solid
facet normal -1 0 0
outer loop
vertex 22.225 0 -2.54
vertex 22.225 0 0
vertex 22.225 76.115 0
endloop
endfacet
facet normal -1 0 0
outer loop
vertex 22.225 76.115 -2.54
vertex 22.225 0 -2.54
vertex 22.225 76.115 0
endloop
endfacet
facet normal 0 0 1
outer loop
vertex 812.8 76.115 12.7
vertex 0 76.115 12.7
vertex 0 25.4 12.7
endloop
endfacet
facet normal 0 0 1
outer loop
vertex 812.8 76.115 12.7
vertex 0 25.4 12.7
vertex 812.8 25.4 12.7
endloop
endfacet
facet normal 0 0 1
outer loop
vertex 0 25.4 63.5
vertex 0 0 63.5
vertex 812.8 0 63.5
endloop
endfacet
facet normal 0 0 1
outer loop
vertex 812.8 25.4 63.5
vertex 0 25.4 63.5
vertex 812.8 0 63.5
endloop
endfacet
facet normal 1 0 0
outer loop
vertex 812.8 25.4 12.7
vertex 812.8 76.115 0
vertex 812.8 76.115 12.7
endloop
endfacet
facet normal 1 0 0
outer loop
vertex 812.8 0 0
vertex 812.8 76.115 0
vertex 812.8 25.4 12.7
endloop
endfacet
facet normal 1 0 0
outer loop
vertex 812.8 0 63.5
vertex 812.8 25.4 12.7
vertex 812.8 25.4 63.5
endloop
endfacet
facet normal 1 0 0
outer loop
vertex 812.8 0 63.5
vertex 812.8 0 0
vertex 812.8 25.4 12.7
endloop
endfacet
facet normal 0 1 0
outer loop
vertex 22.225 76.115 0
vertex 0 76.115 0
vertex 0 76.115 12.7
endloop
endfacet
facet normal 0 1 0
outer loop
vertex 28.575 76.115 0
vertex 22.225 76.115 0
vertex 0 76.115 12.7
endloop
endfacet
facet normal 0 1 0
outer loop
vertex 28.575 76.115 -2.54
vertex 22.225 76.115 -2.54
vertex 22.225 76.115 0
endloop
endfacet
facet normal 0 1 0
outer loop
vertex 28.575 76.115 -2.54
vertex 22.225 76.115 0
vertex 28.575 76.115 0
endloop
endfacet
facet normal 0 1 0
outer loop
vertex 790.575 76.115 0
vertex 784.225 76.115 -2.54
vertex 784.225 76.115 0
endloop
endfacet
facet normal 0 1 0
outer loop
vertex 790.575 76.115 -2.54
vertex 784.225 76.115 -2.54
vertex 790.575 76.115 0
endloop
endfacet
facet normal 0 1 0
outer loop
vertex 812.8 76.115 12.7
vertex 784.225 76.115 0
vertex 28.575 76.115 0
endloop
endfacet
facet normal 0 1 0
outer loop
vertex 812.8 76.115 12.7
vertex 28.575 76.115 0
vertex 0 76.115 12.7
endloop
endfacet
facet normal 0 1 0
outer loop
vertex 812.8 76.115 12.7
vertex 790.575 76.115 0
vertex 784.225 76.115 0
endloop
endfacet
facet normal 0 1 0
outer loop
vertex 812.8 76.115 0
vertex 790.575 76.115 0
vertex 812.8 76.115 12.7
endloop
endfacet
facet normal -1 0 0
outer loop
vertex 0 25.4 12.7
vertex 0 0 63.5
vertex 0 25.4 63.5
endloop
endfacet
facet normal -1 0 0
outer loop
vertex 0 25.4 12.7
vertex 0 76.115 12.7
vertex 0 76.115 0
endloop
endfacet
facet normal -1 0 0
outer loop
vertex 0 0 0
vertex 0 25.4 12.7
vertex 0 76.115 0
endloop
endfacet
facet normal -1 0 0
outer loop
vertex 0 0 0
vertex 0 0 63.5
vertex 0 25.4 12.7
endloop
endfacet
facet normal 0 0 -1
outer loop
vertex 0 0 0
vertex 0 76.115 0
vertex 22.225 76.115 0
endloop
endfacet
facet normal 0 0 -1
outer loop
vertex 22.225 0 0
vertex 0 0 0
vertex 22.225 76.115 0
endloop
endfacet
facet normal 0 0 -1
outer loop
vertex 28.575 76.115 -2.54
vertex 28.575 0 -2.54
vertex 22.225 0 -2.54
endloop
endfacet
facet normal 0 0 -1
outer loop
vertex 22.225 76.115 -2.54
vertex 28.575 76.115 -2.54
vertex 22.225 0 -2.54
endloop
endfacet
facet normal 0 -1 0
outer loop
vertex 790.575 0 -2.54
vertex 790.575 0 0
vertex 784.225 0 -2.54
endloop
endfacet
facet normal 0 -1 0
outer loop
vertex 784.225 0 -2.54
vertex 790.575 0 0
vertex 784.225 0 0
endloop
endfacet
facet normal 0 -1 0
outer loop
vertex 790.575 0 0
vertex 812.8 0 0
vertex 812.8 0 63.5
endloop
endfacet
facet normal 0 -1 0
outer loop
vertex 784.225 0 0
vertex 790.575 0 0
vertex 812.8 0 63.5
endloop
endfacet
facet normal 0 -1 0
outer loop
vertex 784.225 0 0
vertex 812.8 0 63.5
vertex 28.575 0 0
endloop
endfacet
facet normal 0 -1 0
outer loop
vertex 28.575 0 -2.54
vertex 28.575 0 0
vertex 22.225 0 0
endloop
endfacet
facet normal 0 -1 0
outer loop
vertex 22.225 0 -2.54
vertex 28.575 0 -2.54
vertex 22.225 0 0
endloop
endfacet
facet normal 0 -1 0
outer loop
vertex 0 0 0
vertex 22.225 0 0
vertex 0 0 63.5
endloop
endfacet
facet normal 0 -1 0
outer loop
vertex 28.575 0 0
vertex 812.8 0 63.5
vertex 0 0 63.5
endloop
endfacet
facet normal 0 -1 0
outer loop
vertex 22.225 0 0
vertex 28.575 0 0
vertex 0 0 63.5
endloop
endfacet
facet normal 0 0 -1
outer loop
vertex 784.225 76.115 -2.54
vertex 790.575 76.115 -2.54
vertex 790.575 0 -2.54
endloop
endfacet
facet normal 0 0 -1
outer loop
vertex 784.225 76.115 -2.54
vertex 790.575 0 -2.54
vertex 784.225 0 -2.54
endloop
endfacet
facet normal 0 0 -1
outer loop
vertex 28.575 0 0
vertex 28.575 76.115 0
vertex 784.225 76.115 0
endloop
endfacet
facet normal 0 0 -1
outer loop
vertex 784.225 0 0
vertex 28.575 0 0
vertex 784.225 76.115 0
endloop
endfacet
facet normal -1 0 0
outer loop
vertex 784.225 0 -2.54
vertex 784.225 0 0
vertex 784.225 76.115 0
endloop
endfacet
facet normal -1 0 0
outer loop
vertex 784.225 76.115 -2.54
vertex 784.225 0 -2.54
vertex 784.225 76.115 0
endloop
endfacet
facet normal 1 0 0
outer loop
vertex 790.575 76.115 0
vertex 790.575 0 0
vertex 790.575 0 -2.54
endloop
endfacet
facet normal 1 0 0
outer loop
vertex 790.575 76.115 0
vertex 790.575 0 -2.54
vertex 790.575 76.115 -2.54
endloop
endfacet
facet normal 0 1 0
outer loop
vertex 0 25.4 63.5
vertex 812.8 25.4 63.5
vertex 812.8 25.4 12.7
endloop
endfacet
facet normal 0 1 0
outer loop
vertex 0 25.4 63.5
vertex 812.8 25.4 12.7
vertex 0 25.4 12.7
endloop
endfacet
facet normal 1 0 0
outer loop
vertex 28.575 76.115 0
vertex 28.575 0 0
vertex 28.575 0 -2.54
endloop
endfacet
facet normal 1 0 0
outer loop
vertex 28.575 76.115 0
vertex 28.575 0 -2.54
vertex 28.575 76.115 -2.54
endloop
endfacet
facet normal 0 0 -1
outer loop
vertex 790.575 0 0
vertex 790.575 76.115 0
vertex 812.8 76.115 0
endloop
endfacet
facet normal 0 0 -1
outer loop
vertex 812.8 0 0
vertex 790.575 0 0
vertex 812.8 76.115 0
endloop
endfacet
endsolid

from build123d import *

# Parameters (mm, degrees)
SKETCH1_W           = 812.8
SKETCH1_H           = 76.114888738
BOSS_EXTRUDE1_DEPTH = 12.7
BOSS_EXTRUDE2_DEPTH = 25.4
SKETCH3_W           = 6.35
SKETCH3_H           = 76.114888738
BOSS_EXTRUDE4_DEPTH = 2.54


with BuildPart() as part:
    # Sketch1 → Boss-Extrude1 (new body)
    with BuildSketch(Plane.XY):
        with Locations((406.4, 38.057444369)):
            Rectangle(SKETCH1_W, SKETCH1_H)
    extrude(amount=BOSS_EXTRUDE1_DEPTH)

    # Sketch2 → Boss-Extrude2 (add)
    with BuildSketch(Plane.XZ):
        Polygon((0, 12.7), (0, 63.5), (812.8, 63.5), (812.8, 12.7), (812.8, 0), (0, 0), align=None)
    extrude(amount=-BOSS_EXTRUDE2_DEPTH)

    # Sketch3 → Boss-Extrude4 (add)
    with BuildSketch(Plane(origin=(0, 0, 0), x_dir=(-1, 0, 0), z_dir=(0, 0, -1))):
        with Locations((-787.4, 38.057444369)):
            Rectangle(SKETCH3_W, SKETCH3_H)
        with Locations((-25.4, 38.057444369)):
            Rectangle(SKETCH3_W, SKETCH3_H)
    extrude(amount=BOSS_EXTRUDE4_DEPTH)


solid = part.part
